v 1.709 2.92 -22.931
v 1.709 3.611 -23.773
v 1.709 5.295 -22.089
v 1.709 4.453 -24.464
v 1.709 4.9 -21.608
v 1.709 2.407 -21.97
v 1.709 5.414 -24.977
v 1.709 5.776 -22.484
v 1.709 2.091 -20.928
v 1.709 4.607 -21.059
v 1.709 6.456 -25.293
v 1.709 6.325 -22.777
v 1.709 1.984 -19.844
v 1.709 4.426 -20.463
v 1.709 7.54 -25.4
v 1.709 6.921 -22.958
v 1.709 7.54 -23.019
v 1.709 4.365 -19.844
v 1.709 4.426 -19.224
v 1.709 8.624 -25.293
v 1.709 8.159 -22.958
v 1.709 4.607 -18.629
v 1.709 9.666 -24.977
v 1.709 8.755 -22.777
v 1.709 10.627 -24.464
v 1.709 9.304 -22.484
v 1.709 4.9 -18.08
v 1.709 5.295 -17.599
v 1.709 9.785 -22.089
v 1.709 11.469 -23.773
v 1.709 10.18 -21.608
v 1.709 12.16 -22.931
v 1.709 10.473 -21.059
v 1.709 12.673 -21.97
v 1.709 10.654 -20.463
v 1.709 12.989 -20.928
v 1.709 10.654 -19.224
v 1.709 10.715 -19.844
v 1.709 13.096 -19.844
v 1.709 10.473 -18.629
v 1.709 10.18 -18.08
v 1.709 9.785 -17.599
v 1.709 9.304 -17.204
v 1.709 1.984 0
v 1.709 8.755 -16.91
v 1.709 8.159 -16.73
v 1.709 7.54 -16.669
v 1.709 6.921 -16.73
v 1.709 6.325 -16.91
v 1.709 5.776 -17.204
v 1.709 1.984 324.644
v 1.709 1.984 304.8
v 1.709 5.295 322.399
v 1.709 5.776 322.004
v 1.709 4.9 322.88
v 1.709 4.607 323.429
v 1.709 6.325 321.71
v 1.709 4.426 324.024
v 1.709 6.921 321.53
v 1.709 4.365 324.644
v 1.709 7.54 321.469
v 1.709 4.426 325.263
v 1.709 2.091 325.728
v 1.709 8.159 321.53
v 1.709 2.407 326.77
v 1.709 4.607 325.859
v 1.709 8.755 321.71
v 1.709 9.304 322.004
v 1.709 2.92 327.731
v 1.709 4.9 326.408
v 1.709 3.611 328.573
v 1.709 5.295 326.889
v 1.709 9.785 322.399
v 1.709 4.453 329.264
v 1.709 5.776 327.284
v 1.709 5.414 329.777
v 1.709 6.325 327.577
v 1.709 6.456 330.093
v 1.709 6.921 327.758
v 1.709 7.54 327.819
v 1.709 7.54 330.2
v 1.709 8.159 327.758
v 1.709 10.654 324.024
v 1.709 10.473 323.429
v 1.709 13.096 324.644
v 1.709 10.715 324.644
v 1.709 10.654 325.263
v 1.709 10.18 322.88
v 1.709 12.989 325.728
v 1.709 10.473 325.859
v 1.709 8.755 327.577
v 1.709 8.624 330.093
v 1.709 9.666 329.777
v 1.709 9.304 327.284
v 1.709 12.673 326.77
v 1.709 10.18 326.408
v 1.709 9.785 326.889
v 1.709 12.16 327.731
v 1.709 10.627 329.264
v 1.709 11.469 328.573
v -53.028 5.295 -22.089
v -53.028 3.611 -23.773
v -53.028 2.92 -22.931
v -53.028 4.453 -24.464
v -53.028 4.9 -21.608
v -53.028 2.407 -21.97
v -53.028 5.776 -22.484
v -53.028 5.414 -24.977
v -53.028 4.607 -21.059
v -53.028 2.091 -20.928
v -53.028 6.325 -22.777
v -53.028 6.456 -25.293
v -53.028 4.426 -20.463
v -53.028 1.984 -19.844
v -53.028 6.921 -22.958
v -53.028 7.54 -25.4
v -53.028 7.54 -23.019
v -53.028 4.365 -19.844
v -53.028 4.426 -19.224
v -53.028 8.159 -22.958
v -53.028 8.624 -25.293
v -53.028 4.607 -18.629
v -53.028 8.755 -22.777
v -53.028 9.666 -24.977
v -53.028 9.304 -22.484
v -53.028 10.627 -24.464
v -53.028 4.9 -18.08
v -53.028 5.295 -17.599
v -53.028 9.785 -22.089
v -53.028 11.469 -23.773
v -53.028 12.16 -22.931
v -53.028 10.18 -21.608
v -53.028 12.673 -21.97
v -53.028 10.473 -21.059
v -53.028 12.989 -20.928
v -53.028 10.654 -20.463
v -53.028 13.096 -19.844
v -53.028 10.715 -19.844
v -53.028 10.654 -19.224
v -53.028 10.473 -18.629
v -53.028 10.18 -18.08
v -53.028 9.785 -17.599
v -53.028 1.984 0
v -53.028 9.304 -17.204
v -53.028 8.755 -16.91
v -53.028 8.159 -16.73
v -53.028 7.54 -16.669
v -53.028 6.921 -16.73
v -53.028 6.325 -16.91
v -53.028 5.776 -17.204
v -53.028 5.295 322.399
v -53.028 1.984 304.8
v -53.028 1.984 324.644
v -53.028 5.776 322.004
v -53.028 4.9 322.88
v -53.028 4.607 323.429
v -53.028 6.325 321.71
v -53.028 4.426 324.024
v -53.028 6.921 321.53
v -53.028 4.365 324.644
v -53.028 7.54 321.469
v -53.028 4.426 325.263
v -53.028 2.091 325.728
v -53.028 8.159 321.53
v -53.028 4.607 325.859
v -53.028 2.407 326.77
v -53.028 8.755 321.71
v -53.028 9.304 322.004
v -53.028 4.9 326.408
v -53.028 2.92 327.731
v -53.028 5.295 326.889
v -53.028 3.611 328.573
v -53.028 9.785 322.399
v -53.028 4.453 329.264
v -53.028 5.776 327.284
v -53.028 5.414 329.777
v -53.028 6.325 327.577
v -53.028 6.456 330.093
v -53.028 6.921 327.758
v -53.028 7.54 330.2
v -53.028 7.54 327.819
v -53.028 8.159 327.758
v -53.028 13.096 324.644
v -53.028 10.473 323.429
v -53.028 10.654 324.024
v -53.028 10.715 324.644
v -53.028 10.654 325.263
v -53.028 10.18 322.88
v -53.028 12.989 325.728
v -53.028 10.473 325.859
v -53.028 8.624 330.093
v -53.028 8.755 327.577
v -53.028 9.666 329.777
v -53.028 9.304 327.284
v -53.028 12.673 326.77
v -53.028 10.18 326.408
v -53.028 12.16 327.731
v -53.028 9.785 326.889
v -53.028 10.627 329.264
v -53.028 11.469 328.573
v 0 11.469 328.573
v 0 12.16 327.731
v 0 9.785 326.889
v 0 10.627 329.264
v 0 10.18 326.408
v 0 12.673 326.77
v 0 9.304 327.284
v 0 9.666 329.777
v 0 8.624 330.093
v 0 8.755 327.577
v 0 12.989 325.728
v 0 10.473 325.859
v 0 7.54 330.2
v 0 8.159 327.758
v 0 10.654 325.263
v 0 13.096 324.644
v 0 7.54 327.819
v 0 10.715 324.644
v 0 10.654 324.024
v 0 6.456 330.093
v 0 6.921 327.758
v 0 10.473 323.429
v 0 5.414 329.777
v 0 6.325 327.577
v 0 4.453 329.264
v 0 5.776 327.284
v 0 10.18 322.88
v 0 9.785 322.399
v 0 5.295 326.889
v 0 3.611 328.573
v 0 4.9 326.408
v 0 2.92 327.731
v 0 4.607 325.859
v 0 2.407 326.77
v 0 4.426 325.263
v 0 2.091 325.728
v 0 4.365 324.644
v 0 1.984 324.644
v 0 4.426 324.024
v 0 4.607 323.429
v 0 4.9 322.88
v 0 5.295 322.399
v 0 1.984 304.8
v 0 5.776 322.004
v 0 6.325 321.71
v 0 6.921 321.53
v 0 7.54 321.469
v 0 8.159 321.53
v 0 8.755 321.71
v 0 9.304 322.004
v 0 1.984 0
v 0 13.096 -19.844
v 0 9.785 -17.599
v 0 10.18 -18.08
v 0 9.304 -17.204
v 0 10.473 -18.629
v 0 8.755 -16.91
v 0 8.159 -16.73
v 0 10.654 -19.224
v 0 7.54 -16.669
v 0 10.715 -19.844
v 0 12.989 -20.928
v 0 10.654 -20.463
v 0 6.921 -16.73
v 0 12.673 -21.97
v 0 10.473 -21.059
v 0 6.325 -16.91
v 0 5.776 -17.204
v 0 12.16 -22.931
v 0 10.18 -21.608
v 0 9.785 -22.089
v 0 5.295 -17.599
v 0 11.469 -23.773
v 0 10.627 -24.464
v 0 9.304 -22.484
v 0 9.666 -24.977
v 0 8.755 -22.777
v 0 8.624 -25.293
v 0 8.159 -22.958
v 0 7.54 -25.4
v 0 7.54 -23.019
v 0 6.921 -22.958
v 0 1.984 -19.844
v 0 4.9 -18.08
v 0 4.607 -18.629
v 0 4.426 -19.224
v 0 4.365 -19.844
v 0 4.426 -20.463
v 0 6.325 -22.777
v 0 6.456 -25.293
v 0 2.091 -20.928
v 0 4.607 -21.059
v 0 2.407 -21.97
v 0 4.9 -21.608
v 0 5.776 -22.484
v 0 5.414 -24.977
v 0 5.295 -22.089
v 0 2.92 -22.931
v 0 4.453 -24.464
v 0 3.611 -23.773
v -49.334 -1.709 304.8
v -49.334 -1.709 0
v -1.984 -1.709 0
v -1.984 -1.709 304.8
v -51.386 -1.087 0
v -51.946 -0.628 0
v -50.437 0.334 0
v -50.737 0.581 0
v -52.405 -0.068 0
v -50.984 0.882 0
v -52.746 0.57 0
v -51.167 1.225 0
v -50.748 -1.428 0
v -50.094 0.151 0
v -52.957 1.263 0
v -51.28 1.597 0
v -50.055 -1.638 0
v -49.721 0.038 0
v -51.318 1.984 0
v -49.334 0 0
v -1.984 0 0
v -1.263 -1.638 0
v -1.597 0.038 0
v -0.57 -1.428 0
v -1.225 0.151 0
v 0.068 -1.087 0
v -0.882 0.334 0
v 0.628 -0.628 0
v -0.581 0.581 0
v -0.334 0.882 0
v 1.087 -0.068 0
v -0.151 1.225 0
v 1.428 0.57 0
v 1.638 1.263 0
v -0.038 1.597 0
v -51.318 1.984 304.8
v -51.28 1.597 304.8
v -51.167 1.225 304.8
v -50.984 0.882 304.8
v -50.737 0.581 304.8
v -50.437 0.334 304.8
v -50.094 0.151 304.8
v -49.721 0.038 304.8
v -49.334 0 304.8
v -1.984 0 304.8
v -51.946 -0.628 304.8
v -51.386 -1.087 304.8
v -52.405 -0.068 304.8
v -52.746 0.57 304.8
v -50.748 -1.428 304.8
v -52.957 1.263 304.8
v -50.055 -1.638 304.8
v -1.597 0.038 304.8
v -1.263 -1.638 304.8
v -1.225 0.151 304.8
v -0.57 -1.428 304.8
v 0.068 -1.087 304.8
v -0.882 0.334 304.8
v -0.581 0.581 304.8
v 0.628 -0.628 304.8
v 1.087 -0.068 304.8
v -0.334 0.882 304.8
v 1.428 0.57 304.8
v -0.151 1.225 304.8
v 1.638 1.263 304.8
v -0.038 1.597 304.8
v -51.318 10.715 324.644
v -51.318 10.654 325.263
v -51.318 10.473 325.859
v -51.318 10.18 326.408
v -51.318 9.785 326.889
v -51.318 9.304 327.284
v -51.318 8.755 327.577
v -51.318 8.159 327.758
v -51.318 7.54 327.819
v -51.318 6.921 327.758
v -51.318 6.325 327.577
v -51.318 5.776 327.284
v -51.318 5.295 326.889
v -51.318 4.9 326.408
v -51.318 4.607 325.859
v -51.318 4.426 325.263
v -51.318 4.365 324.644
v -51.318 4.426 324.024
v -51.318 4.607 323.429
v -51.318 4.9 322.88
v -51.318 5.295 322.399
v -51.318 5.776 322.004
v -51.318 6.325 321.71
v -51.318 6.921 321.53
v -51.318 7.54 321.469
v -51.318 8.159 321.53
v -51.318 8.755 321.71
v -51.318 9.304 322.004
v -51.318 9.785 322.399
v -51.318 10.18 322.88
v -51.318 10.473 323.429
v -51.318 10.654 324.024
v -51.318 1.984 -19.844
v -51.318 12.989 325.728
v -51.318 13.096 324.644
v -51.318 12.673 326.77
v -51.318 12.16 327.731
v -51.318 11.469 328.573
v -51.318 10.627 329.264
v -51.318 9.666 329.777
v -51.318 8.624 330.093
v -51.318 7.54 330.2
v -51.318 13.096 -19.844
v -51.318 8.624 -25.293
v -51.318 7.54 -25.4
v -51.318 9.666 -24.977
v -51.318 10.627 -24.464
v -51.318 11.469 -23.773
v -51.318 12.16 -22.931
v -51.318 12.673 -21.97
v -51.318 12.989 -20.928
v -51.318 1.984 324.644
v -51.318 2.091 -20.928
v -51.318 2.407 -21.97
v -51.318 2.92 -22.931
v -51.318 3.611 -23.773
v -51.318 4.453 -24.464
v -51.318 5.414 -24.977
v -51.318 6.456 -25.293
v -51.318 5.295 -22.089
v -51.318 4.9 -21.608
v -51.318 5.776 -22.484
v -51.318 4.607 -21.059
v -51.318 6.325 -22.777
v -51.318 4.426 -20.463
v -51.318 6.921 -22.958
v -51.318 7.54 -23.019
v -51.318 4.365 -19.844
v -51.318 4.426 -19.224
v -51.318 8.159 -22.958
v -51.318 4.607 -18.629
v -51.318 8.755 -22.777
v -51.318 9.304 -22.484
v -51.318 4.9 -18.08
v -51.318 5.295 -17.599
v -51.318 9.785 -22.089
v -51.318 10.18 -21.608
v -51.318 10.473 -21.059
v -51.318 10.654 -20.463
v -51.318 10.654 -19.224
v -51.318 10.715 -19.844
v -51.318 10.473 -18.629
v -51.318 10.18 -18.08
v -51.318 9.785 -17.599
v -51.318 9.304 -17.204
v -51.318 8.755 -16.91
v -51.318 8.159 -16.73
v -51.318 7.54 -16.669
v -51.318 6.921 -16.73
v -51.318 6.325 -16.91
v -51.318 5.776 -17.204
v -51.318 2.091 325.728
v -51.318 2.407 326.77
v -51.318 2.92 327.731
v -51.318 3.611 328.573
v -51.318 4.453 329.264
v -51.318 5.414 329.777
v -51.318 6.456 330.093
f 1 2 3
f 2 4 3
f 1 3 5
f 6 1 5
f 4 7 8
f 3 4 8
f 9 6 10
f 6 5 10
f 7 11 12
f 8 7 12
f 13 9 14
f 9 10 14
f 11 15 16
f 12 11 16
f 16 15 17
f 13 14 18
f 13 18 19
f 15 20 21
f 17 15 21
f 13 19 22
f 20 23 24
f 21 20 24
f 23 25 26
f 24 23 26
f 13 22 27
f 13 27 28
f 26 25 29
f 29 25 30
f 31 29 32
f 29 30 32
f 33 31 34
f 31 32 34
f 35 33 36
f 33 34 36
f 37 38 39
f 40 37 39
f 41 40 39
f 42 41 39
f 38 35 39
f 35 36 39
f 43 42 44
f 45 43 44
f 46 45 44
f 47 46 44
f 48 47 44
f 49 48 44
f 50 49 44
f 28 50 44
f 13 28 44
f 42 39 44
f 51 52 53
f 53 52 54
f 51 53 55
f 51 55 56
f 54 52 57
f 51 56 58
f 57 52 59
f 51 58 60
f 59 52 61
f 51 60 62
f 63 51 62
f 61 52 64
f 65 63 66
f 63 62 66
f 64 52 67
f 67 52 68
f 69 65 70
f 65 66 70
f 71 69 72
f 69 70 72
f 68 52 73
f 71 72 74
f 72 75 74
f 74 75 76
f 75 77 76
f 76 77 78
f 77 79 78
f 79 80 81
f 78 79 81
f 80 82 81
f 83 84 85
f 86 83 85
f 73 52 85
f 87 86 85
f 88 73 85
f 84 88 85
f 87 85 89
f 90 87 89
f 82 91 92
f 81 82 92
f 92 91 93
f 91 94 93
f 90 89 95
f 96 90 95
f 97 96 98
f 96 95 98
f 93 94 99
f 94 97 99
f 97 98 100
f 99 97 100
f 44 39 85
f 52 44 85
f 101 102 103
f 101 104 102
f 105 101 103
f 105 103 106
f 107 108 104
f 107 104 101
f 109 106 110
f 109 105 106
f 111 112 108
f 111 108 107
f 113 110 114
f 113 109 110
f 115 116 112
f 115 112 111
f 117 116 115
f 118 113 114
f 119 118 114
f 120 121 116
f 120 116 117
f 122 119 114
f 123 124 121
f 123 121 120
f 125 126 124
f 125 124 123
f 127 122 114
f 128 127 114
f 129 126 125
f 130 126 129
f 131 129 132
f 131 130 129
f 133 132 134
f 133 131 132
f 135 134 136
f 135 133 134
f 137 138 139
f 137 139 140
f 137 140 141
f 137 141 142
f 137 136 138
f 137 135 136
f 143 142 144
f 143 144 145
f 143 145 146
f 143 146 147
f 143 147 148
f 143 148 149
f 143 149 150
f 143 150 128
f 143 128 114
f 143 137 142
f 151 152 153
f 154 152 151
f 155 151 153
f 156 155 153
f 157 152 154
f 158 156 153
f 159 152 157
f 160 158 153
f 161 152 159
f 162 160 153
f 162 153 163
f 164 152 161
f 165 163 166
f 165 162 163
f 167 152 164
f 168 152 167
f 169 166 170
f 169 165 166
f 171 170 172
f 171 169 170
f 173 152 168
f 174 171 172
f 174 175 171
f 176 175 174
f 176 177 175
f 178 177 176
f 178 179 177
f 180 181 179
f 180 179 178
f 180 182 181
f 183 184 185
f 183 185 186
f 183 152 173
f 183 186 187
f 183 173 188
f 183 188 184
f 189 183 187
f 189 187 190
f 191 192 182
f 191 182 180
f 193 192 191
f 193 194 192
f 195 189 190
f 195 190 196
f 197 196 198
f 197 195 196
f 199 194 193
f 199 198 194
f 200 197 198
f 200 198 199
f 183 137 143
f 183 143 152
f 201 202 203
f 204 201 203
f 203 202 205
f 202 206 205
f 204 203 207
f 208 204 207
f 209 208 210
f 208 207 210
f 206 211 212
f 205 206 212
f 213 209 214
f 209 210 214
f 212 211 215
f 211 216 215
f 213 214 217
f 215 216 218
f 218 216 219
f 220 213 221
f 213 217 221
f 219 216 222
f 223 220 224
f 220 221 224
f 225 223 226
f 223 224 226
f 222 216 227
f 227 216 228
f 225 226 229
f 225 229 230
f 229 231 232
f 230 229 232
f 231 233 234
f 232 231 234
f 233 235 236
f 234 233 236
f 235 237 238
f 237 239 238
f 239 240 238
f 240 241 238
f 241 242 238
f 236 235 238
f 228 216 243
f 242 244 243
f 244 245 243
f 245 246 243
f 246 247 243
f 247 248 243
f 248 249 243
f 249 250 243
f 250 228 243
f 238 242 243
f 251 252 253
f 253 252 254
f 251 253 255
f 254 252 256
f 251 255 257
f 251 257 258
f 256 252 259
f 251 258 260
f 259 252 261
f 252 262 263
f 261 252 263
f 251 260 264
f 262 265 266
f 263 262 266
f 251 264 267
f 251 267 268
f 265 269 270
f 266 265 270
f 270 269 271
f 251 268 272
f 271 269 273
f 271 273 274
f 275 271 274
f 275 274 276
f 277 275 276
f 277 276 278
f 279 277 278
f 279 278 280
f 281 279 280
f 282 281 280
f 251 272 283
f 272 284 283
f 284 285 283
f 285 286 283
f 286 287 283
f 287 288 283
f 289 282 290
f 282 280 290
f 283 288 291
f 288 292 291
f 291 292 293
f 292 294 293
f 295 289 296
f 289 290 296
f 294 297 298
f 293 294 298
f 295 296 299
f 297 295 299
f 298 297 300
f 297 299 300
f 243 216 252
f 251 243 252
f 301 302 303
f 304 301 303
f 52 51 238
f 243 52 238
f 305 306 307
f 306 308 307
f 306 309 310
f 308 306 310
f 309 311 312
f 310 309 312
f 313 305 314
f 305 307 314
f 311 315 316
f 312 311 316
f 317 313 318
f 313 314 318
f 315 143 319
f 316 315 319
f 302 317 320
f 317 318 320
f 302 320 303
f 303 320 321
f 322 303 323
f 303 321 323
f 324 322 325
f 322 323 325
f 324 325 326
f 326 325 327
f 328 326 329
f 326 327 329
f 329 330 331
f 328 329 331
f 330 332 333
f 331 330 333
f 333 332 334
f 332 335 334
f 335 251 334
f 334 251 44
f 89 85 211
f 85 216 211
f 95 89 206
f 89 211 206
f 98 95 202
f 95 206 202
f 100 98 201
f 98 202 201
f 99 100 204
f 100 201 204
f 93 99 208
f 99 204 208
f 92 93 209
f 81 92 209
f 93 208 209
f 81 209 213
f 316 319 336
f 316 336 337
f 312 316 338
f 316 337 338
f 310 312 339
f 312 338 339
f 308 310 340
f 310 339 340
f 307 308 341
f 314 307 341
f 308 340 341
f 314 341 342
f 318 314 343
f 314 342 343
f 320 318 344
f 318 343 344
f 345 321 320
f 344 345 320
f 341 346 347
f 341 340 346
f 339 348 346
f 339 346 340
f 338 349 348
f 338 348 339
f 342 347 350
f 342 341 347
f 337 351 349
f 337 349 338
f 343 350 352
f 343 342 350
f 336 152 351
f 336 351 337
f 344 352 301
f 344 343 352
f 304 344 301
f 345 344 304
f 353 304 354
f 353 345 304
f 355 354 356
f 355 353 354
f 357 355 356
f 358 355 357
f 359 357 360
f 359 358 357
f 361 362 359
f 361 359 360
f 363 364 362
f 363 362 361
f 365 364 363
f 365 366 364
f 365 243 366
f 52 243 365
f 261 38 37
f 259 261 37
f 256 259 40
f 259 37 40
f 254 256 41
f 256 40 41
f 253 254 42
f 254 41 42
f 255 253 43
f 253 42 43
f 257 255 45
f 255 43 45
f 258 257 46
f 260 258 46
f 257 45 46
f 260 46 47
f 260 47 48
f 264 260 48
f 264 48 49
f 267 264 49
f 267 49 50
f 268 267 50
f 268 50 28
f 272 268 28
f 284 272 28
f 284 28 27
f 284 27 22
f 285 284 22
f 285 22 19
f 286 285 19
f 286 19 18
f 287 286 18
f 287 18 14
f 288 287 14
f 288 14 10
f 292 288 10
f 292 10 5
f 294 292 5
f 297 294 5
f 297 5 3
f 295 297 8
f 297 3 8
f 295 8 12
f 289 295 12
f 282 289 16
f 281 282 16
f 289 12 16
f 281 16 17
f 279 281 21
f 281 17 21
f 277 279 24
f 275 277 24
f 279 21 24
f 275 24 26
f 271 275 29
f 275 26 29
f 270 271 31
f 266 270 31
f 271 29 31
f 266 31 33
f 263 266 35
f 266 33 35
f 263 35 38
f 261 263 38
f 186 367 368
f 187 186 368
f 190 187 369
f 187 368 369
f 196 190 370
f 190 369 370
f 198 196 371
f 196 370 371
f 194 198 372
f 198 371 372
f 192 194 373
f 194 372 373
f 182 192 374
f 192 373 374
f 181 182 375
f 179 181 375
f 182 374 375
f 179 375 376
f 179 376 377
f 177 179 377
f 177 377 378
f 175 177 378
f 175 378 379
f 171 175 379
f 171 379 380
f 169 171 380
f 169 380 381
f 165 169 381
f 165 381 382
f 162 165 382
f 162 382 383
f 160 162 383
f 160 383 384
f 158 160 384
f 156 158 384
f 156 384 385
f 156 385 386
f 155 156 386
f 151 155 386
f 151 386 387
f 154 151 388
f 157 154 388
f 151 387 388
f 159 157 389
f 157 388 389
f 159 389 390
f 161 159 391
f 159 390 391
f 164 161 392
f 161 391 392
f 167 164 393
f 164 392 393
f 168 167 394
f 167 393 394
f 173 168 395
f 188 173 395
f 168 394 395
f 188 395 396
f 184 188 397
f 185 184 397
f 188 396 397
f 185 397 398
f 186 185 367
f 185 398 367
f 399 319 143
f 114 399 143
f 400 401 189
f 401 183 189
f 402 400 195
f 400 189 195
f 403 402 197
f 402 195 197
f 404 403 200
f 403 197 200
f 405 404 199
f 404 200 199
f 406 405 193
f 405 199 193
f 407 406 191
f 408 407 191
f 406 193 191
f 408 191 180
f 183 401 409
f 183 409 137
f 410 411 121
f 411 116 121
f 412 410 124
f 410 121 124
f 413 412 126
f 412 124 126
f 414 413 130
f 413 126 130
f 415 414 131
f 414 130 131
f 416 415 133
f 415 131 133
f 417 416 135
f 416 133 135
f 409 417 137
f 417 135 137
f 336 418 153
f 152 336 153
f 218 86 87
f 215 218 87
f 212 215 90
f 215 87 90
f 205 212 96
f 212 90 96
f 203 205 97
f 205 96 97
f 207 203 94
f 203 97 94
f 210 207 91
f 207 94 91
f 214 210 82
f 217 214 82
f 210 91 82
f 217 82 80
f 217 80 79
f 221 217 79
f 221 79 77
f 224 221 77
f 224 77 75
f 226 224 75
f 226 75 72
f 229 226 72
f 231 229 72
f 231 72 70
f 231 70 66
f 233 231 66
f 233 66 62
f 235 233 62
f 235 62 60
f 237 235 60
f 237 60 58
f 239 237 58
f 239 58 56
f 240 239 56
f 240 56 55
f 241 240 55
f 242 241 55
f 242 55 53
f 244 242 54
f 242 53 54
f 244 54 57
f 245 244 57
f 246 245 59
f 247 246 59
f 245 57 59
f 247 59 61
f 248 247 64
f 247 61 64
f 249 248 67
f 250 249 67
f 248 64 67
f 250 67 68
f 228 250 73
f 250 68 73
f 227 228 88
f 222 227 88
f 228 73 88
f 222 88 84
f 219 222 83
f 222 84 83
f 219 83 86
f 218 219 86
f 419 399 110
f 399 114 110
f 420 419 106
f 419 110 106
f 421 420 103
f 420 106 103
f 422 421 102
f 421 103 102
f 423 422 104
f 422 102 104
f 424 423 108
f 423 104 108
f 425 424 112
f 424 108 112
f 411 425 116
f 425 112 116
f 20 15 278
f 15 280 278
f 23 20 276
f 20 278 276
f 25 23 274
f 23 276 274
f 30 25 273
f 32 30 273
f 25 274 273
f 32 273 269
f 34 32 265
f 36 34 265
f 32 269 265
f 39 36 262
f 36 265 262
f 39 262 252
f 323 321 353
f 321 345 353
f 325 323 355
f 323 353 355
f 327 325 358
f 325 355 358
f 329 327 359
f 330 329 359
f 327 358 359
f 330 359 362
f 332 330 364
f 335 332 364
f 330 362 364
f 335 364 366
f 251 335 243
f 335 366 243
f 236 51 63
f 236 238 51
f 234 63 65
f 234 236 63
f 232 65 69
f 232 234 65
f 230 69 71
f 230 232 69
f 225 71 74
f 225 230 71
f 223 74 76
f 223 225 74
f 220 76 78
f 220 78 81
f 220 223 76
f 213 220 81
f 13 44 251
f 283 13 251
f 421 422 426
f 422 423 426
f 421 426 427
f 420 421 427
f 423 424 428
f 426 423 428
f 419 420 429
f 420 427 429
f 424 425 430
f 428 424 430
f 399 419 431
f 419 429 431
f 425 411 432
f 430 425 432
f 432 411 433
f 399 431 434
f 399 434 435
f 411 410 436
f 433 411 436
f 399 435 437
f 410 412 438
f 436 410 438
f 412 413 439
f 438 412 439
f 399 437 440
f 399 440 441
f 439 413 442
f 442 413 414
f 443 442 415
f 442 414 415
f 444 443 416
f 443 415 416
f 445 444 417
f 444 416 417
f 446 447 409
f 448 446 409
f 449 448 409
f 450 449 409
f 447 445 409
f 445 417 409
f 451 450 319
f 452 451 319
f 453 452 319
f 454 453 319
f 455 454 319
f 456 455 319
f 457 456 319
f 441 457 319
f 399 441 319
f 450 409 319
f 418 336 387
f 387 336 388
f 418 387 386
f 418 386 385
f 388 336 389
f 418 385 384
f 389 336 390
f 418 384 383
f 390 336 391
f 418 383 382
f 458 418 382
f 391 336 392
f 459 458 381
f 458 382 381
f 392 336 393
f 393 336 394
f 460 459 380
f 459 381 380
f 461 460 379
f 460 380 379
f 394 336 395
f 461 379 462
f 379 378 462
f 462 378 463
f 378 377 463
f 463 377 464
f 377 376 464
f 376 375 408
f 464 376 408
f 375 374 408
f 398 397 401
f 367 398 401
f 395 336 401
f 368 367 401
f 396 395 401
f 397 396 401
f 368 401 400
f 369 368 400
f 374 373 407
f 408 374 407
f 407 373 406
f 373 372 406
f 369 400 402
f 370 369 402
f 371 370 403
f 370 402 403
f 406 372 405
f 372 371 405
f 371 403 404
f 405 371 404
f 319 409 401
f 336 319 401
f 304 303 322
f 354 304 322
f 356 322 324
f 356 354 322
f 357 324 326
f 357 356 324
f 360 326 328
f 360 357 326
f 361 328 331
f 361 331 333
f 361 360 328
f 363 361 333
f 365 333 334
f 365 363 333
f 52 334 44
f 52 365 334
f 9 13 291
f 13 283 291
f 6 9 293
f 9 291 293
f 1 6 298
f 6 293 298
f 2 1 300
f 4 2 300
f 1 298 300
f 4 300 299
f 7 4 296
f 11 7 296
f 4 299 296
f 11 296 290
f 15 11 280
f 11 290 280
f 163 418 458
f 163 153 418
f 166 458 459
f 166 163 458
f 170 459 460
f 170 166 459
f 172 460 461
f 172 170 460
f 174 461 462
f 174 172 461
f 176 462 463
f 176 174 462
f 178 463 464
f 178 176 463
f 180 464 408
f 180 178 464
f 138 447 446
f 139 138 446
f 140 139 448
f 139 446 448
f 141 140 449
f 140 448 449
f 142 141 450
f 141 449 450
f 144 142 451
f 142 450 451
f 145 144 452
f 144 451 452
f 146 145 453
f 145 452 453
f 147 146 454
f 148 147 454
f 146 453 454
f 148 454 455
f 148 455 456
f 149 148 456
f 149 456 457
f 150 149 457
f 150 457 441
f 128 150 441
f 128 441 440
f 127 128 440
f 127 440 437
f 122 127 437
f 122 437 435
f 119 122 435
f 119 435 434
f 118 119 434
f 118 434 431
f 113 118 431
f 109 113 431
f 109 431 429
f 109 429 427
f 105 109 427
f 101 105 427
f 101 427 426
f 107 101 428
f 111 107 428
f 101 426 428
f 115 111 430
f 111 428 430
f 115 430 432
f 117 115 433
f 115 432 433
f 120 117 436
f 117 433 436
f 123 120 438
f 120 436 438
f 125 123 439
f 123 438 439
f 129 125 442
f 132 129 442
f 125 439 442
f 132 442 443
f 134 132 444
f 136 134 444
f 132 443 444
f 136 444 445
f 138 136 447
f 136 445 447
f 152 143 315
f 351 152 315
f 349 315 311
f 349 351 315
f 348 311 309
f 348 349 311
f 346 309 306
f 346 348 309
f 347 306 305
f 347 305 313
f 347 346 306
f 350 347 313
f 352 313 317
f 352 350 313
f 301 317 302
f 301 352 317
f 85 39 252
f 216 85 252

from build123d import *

# Parameters (mm, degrees)
F1_DEPTH = 304.8
F2_R     = 3.69316
F3_R     = 1.98374
F4_W     = 1.70942
F4_H     = 25.4
F6_DEPTH = 11.1125
F7_R     = 5.55624
F8_R     = 3.175
F9_DEPTH = 54.737


# Not quite as in the source:
# - a fillet or chamfer is up to 0.001 mm smaller than in the source, because OpenCascade refuses the exact size


with BuildPart() as f1:
    # F0 (on Top) → F1 (new body)
    with BuildSketch(Plane.XY):
        Polygon((0, 13.09624), (0, 0), (-51.31816, 0), (-51.31816, 13.09624), (-53.02758, 13.09624), (-53.02758, -1.70942), (1.70942, -1.70942), (1.70942, 13.09624), align=None)
    extrude(amount=F1_DEPTH)

    # F2
    f2_edges = [f1.edges().sort_by_distance(p)[0] for p in [
        (1.70942, -1.70942, 152.4),
        (-53.02758, -1.70942, 152.4),
    ]]
    fillet(f2_edges, radius=F2_R)

    # F3
    f3_edges = [f1.edges().sort_by_distance(p)[0] for p in [
        (0, 0, 152.4),
        (-51.31816, 0, 152.4),
    ]]
    fillet(f3_edges, radius=F3_R)

    # F4 (on face) → F6 (join, through all)
    with BuildSketch(Plane(origin=(0, 13.09624, 0), x_dir=(-1, 0, 0), z_dir=(0, 1, 0))):
        with Locations((52.17287, 317.5)):
            Rectangle(F4_W, F4_H)
        with Locations((-0.85471, 317.5)):
            Rectangle(F4_W, F4_H)
        with Locations((-0.85471, -12.7)):
            Rectangle(F4_W, F4_H)
        with Locations((52.17287, -12.7)):
            Rectangle(F4_W, F4_H)
    extrude(amount=-F6_DEPTH)

    # F7 (radius 5.55625 in the source; OpenCascade refuses exactly that, so slightly less here)
    f7_edges = [f1.edges().sort_by_distance(p)[0] for p in [
        (-52.17287, 13.09624, -25.4),
        (0.85471, 13.09624, -25.4),
        (0.85471, 13.09624, 330.2),
        (-52.17287, 13.09624, 330.2),
        (-52.17287, 1.98374, -25.4),
        (-52.17287, 1.98374, 330.2),
        (0.85471, 1.98374, 330.2),
        (0.85471, 1.98374, -25.4),
    ]]
    fillet(f7_edges, radius=F7_R)

    # F8 (on face) → F9 (cut, through all)
    with BuildSketch(Plane.YZ.offset(1.70942)):
        with Locations((7.53999, -19.84375)):
            Circle(F8_R)
        with Locations((7.53999, 324.64375)):
            Circle(F8_R)
    extrude(amount=-F9_DEPTH, mode=Mode.SUBTRACT)


solid = f1.part
